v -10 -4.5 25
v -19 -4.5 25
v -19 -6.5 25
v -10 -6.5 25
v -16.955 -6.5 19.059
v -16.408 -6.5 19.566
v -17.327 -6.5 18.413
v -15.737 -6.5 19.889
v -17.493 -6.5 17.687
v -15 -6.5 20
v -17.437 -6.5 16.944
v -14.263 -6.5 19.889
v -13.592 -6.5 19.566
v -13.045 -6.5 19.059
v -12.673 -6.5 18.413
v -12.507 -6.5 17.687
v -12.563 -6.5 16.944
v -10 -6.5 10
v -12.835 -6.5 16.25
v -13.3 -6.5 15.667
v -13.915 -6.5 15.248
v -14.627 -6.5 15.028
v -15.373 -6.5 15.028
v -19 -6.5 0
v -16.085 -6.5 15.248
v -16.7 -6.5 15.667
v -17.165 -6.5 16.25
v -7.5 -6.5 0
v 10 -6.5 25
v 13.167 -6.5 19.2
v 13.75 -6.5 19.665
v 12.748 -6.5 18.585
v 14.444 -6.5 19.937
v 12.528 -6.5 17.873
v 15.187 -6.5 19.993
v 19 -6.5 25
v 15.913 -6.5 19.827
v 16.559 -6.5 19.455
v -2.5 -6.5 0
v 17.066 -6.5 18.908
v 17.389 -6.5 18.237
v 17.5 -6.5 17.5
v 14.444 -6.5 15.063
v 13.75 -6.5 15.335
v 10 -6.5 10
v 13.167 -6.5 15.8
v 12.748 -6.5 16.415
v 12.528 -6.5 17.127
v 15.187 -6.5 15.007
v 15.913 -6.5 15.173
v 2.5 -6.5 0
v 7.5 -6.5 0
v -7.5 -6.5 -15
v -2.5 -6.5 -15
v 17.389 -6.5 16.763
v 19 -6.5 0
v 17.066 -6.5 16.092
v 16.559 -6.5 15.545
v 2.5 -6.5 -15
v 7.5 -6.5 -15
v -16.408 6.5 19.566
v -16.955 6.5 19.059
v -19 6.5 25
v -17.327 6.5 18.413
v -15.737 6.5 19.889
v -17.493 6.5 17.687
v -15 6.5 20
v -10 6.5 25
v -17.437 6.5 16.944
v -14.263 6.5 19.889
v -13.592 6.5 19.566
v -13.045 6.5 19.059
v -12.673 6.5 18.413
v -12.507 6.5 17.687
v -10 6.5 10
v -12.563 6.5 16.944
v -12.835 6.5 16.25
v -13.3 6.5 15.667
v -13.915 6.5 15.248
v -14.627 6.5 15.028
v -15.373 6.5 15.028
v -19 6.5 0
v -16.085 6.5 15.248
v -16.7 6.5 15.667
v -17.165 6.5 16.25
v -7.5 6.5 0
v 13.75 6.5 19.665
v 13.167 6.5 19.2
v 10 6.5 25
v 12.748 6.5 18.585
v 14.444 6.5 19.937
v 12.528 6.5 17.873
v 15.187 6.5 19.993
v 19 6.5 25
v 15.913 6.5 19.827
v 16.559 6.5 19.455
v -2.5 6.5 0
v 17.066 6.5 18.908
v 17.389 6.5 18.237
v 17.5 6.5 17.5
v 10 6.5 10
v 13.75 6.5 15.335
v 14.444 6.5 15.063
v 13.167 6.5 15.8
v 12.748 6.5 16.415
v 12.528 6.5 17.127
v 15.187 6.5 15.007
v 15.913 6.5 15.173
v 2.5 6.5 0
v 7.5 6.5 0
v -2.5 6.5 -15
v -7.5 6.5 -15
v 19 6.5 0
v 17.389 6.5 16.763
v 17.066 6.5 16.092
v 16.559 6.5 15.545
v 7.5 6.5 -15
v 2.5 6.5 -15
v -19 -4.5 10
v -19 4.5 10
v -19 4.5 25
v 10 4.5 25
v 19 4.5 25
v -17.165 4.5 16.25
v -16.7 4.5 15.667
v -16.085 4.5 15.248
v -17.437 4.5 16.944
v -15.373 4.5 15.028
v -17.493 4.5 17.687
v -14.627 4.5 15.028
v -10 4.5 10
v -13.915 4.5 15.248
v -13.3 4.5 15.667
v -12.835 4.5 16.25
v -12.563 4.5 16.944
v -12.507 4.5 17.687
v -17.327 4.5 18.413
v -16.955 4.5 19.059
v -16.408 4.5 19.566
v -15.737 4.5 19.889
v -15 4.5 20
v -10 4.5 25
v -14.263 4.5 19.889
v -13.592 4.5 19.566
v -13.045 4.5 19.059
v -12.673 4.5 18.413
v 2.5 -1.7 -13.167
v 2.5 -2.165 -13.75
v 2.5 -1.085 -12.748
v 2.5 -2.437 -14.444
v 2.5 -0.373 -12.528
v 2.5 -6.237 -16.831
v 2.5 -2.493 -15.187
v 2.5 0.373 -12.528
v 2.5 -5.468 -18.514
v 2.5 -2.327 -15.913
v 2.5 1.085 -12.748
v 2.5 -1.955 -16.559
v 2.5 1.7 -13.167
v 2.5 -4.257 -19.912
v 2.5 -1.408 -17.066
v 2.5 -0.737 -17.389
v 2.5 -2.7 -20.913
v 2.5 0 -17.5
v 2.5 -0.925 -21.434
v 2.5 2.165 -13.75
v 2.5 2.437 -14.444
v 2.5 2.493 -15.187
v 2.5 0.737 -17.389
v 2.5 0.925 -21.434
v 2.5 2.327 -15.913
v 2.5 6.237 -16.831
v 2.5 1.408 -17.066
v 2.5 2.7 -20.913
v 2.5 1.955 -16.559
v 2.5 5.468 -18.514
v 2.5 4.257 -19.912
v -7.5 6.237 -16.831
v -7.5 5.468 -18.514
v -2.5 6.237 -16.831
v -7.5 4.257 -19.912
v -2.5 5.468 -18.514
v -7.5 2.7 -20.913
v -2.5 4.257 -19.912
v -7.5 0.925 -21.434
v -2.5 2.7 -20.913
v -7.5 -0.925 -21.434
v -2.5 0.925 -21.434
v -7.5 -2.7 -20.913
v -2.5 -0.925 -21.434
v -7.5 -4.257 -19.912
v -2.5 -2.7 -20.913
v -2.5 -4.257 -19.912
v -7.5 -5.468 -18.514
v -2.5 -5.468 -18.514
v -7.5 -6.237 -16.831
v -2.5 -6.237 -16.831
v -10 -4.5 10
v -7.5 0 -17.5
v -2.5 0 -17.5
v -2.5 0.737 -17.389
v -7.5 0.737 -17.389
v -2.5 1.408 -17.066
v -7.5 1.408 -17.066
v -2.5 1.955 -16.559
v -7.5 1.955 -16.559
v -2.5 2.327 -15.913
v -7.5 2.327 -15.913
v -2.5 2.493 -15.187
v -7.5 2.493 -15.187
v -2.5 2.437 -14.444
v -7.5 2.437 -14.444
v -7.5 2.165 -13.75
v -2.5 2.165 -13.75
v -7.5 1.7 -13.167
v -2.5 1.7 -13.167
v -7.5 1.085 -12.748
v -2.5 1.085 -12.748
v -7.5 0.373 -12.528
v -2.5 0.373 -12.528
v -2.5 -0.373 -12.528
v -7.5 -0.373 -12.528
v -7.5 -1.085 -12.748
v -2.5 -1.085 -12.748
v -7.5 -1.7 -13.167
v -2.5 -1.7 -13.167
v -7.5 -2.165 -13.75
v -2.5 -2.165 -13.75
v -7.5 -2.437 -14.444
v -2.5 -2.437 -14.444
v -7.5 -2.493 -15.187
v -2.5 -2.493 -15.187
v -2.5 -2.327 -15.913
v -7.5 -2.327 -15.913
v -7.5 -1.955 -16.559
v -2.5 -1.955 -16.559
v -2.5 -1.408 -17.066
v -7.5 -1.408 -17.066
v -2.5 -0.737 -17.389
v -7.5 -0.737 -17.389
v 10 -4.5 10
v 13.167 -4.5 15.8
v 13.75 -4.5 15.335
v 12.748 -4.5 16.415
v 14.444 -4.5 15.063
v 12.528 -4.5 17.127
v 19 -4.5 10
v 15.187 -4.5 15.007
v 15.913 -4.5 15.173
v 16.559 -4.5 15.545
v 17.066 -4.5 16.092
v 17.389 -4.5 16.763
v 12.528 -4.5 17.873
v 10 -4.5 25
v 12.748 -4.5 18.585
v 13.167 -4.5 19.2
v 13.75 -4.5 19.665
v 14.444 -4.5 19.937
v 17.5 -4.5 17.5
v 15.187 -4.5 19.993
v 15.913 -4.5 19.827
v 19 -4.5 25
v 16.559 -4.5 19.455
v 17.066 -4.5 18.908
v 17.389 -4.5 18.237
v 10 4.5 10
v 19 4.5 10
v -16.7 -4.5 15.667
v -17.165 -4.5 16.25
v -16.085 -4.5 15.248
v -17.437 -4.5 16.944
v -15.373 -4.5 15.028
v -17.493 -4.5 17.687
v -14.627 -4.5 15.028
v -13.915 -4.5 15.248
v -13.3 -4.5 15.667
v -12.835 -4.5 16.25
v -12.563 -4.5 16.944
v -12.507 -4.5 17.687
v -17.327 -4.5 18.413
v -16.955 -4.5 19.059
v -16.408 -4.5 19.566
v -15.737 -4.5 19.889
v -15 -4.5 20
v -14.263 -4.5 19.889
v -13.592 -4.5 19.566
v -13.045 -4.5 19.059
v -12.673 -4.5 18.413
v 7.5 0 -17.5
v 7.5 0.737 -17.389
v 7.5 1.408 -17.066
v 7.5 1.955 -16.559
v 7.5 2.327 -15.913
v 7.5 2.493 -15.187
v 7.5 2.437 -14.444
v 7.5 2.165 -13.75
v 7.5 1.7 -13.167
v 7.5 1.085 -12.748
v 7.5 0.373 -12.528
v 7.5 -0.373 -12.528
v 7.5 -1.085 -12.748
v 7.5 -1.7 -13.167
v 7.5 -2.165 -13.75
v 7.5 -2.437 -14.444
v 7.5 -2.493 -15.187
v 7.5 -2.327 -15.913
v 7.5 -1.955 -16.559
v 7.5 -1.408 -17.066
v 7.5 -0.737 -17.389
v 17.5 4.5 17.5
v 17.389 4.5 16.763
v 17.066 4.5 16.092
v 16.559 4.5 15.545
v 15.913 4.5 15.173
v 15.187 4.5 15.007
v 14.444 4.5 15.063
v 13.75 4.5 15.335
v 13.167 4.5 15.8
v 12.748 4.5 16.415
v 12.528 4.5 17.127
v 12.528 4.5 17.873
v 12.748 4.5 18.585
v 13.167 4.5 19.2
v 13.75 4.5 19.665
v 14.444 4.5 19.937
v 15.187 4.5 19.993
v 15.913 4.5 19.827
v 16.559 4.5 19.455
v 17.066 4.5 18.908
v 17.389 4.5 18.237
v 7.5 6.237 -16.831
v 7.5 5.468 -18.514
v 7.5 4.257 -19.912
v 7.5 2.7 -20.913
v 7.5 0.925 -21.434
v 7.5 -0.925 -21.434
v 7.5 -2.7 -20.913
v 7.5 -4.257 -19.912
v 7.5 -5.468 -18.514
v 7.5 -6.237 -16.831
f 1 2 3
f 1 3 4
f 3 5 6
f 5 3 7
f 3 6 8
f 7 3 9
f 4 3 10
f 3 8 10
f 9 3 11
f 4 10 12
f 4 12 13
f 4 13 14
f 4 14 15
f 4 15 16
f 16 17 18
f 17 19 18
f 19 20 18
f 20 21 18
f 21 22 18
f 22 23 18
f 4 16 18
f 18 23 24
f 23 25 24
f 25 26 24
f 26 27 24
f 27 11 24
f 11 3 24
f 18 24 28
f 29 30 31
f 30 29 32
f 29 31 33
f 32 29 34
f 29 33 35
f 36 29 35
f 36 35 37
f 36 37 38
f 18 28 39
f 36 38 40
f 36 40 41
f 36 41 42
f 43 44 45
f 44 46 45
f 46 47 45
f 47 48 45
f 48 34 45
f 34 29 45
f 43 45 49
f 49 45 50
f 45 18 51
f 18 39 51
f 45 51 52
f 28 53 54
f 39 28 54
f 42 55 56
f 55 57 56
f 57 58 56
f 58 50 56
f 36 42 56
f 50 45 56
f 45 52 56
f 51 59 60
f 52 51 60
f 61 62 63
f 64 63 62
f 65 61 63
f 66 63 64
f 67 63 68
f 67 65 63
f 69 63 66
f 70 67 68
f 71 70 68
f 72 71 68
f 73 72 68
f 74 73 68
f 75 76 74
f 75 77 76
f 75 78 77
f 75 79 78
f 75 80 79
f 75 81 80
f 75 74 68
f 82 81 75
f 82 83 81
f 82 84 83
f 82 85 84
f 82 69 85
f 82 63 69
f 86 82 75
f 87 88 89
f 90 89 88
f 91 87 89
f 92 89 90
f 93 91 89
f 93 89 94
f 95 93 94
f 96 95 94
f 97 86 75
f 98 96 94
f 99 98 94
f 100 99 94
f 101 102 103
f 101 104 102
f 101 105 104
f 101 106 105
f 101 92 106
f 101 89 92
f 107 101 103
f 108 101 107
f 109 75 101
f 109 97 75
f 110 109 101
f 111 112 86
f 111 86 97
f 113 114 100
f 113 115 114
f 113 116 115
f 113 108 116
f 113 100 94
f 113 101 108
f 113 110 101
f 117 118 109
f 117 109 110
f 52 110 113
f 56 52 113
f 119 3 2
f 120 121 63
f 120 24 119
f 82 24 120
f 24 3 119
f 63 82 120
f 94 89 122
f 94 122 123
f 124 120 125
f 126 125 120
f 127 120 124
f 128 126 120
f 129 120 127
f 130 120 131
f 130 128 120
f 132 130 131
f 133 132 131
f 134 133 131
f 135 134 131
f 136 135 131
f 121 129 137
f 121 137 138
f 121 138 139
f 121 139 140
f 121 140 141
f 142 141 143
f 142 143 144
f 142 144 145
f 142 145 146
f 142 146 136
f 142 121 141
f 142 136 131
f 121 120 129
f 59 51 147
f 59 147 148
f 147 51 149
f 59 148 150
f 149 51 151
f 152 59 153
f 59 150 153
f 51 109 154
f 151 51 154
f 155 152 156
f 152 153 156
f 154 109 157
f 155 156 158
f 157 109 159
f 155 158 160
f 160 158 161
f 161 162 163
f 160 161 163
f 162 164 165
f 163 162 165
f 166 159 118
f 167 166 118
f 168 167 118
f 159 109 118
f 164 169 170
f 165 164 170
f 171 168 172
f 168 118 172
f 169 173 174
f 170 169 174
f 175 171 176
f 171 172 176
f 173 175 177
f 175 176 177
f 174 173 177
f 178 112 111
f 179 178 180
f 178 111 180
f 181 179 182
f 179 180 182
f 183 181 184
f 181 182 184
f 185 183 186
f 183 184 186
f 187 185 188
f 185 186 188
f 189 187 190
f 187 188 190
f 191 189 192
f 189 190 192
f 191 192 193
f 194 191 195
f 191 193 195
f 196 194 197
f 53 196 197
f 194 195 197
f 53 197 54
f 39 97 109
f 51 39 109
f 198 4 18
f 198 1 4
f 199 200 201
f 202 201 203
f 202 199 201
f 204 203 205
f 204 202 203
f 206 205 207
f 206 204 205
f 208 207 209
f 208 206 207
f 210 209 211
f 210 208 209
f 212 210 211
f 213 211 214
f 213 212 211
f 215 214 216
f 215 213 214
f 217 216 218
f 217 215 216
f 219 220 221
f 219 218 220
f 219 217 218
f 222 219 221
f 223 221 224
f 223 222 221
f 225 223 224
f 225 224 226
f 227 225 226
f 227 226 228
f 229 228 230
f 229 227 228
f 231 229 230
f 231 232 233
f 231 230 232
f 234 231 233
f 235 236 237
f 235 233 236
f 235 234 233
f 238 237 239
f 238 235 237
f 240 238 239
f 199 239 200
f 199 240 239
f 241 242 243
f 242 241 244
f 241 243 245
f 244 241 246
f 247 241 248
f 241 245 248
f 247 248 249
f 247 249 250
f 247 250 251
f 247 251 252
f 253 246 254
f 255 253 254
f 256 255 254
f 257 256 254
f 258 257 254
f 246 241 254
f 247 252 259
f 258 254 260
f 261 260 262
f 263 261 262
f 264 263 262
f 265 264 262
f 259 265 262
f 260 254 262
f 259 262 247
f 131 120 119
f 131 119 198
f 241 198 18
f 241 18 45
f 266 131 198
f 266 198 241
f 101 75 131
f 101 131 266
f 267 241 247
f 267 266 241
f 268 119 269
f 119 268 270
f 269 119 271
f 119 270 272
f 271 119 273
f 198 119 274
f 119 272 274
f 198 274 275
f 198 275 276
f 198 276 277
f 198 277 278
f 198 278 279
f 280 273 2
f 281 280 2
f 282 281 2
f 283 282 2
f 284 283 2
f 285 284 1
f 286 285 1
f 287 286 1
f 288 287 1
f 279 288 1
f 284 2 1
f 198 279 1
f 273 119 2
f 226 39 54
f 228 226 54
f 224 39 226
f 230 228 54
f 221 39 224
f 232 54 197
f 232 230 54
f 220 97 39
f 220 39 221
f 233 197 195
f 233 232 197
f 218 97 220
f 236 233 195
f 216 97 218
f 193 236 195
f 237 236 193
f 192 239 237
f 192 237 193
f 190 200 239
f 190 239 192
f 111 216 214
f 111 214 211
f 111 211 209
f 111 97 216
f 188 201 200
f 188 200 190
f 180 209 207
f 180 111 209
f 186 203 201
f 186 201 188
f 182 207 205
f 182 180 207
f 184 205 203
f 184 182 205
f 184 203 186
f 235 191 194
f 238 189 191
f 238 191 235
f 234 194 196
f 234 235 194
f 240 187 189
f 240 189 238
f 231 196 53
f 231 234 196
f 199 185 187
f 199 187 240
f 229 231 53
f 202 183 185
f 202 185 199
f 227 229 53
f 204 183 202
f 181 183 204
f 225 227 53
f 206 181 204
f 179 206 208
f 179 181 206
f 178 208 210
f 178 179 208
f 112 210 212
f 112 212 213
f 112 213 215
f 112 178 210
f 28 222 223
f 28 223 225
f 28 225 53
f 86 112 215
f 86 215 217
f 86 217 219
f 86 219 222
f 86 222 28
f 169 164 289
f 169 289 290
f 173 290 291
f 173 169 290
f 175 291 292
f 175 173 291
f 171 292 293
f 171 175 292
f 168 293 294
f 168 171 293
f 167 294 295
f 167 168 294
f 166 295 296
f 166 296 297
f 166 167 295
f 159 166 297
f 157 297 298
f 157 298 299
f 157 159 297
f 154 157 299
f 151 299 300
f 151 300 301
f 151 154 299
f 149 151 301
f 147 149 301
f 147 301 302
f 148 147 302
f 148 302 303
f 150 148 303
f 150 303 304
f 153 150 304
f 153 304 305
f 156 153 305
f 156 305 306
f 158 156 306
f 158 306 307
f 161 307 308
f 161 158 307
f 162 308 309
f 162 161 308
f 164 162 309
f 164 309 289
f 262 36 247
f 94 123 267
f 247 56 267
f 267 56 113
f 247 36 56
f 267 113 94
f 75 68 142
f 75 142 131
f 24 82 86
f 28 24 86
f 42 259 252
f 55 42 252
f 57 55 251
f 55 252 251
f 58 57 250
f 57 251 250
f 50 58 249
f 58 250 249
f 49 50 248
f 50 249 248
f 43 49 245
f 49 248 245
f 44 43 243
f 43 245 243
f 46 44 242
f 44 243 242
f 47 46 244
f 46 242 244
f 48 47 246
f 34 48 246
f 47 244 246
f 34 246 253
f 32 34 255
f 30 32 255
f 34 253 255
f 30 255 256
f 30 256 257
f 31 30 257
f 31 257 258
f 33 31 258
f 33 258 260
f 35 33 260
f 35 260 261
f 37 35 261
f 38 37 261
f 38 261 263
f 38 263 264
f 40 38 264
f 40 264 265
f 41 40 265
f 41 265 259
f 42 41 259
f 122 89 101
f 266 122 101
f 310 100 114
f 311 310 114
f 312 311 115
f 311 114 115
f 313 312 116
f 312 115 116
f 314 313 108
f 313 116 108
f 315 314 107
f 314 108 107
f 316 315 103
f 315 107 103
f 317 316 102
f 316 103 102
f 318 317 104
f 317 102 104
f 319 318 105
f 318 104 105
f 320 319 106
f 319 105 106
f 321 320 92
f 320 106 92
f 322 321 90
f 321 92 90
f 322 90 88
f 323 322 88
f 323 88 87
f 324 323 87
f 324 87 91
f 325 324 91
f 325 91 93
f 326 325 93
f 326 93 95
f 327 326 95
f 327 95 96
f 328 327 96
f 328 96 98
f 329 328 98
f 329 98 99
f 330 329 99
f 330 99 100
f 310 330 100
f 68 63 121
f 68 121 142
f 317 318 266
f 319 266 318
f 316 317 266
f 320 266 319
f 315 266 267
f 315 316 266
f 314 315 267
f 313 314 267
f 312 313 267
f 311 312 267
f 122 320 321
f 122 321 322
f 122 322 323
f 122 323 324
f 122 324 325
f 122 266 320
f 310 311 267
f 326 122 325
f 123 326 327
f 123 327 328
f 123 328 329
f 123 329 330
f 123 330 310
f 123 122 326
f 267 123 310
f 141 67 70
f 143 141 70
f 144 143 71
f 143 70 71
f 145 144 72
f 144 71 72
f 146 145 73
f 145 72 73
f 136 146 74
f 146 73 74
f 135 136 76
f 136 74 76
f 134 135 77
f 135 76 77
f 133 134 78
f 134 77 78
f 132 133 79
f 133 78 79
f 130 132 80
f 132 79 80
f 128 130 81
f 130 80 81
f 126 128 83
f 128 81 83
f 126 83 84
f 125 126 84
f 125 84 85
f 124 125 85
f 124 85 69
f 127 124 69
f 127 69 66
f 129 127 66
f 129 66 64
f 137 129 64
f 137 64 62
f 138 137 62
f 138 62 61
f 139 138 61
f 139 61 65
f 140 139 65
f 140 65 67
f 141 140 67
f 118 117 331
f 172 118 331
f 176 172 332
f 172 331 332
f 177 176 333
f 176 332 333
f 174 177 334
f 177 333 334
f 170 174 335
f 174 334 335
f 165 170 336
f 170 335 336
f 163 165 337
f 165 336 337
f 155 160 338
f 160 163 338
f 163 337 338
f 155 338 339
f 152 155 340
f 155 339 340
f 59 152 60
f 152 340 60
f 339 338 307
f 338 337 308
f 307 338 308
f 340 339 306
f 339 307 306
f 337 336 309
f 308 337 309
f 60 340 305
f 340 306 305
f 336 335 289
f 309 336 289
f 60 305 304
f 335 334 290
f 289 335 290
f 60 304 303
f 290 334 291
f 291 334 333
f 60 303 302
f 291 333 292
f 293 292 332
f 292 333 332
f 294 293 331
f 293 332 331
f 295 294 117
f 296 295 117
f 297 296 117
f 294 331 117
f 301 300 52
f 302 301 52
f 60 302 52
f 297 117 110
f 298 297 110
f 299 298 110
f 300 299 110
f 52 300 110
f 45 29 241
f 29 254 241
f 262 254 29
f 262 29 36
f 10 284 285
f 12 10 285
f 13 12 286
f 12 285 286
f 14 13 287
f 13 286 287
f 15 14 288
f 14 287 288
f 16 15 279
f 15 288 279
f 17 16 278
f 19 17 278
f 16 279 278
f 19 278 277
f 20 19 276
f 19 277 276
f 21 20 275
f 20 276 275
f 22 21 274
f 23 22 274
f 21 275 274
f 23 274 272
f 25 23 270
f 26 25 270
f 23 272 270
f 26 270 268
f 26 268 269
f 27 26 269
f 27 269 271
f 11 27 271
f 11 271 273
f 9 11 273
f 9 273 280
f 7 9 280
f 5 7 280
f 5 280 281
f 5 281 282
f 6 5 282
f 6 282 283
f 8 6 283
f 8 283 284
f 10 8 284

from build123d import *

# Parameters (mm, degrees)
SKETCH_1_W          = 38
SKETCH_1_H          = 13
EXTRUDE_1_DEPTH     = 25
SKETCH_2_W          = 50.27368421
SKETCH_2_H          = 9
CUT_EXTRUDE_1_DEPTH = 15
SKETCH_3_W          = 20
SKETCH_3_H          = 30
CUT_EXTRUDE_2_DEPTH = 34.985290936
SKETCH_4_R          = 2.5
CUT_EXTRUDE_3_DEPTH = 34.985290936
SKETCH_8_R          = 2.5
EXTRUDE_3_DEPTH     = 7.5
SKETCH_9_W          = 5
SKETCH_9_H          = 54.936954578
CUT_EXTRUDE_5_DEPTH = 34.985290936


with BuildPart() as part:
    # 草图1 → 凸台-拉伸1 (new body)
    with BuildSketch(Plane.XY):
        Rectangle(SKETCH_1_W, SKETCH_1_H)
    extrude(amount=EXTRUDE_1_DEPTH)

    # 草图2 → 切除-拉伸1 (cut)
    with BuildSketch(Plane.XY.offset(25)):
        Rectangle(SKETCH_2_W, SKETCH_2_H)
    extrude(amount=-CUT_EXTRUDE_1_DEPTH, mode=Mode.SUBTRACT)

    # 草图3 → 切除-拉伸2 (cut, through all)
    with BuildSketch(Plane(origin=(0, 6.5, 0), x_dir=(1, 0, 0), z_dir=(0, 1, 0))):
        with Locations((0, -25)):
            Rectangle(SKETCH_3_W, SKETCH_3_H)
    extrude(amount=-CUT_EXTRUDE_2_DEPTH, mode=Mode.SUBTRACT)

    # 草图4 → 切除-拉伸3 (cut, through all)
    with BuildSketch(Plane(origin=(0, 6.5, 0), x_dir=(1, 0, 0), z_dir=(0, 1, 0))):
        with Locations(Location((-15, -17.5, 0), (0, 0, 270))):
            Circle(SKETCH_4_R)
        with Locations((15, -17.5)):
            Circle(SKETCH_4_R)
    extrude(amount=-CUT_EXTRUDE_3_DEPTH, mode=Mode.SUBTRACT)

    # 草图8 → 凸台-拉伸3 (add, symmetric)
    with BuildSketch(Plane(origin=(0, 0, 0), x_dir=(0, 0, -1), z_dir=(1, 0, 0))):
        with BuildLine():
            Line((15, -6.5), (0, -6.5))
            Line((0, -6.5), (0, 6.5))
            Line((0, 6.5), (15, 6.5))
            ThreePointArc((15, 6.5), (21.5, 0), (15, -6.5))
        make_face()
        with Locations((15, 0)):
            Circle(SKETCH_8_R, mode=Mode.SUBTRACT)
    extrude(amount=EXTRUDE_3_DEPTH, both=True)

    # 草图9 → 切除-拉伸5 (cut, through all)
    with BuildSketch(Plane(origin=(0, 6.5, 0), x_dir=(1, 0, 0), z_dir=(0, 1, 0))):
        with Locations((0, 27.468477289)):
            Rectangle(SKETCH_9_W, SKETCH_9_H)
    extrude(amount=-CUT_EXTRUDE_5_DEPTH, mode=Mode.SUBTRACT)


solid = part.part
